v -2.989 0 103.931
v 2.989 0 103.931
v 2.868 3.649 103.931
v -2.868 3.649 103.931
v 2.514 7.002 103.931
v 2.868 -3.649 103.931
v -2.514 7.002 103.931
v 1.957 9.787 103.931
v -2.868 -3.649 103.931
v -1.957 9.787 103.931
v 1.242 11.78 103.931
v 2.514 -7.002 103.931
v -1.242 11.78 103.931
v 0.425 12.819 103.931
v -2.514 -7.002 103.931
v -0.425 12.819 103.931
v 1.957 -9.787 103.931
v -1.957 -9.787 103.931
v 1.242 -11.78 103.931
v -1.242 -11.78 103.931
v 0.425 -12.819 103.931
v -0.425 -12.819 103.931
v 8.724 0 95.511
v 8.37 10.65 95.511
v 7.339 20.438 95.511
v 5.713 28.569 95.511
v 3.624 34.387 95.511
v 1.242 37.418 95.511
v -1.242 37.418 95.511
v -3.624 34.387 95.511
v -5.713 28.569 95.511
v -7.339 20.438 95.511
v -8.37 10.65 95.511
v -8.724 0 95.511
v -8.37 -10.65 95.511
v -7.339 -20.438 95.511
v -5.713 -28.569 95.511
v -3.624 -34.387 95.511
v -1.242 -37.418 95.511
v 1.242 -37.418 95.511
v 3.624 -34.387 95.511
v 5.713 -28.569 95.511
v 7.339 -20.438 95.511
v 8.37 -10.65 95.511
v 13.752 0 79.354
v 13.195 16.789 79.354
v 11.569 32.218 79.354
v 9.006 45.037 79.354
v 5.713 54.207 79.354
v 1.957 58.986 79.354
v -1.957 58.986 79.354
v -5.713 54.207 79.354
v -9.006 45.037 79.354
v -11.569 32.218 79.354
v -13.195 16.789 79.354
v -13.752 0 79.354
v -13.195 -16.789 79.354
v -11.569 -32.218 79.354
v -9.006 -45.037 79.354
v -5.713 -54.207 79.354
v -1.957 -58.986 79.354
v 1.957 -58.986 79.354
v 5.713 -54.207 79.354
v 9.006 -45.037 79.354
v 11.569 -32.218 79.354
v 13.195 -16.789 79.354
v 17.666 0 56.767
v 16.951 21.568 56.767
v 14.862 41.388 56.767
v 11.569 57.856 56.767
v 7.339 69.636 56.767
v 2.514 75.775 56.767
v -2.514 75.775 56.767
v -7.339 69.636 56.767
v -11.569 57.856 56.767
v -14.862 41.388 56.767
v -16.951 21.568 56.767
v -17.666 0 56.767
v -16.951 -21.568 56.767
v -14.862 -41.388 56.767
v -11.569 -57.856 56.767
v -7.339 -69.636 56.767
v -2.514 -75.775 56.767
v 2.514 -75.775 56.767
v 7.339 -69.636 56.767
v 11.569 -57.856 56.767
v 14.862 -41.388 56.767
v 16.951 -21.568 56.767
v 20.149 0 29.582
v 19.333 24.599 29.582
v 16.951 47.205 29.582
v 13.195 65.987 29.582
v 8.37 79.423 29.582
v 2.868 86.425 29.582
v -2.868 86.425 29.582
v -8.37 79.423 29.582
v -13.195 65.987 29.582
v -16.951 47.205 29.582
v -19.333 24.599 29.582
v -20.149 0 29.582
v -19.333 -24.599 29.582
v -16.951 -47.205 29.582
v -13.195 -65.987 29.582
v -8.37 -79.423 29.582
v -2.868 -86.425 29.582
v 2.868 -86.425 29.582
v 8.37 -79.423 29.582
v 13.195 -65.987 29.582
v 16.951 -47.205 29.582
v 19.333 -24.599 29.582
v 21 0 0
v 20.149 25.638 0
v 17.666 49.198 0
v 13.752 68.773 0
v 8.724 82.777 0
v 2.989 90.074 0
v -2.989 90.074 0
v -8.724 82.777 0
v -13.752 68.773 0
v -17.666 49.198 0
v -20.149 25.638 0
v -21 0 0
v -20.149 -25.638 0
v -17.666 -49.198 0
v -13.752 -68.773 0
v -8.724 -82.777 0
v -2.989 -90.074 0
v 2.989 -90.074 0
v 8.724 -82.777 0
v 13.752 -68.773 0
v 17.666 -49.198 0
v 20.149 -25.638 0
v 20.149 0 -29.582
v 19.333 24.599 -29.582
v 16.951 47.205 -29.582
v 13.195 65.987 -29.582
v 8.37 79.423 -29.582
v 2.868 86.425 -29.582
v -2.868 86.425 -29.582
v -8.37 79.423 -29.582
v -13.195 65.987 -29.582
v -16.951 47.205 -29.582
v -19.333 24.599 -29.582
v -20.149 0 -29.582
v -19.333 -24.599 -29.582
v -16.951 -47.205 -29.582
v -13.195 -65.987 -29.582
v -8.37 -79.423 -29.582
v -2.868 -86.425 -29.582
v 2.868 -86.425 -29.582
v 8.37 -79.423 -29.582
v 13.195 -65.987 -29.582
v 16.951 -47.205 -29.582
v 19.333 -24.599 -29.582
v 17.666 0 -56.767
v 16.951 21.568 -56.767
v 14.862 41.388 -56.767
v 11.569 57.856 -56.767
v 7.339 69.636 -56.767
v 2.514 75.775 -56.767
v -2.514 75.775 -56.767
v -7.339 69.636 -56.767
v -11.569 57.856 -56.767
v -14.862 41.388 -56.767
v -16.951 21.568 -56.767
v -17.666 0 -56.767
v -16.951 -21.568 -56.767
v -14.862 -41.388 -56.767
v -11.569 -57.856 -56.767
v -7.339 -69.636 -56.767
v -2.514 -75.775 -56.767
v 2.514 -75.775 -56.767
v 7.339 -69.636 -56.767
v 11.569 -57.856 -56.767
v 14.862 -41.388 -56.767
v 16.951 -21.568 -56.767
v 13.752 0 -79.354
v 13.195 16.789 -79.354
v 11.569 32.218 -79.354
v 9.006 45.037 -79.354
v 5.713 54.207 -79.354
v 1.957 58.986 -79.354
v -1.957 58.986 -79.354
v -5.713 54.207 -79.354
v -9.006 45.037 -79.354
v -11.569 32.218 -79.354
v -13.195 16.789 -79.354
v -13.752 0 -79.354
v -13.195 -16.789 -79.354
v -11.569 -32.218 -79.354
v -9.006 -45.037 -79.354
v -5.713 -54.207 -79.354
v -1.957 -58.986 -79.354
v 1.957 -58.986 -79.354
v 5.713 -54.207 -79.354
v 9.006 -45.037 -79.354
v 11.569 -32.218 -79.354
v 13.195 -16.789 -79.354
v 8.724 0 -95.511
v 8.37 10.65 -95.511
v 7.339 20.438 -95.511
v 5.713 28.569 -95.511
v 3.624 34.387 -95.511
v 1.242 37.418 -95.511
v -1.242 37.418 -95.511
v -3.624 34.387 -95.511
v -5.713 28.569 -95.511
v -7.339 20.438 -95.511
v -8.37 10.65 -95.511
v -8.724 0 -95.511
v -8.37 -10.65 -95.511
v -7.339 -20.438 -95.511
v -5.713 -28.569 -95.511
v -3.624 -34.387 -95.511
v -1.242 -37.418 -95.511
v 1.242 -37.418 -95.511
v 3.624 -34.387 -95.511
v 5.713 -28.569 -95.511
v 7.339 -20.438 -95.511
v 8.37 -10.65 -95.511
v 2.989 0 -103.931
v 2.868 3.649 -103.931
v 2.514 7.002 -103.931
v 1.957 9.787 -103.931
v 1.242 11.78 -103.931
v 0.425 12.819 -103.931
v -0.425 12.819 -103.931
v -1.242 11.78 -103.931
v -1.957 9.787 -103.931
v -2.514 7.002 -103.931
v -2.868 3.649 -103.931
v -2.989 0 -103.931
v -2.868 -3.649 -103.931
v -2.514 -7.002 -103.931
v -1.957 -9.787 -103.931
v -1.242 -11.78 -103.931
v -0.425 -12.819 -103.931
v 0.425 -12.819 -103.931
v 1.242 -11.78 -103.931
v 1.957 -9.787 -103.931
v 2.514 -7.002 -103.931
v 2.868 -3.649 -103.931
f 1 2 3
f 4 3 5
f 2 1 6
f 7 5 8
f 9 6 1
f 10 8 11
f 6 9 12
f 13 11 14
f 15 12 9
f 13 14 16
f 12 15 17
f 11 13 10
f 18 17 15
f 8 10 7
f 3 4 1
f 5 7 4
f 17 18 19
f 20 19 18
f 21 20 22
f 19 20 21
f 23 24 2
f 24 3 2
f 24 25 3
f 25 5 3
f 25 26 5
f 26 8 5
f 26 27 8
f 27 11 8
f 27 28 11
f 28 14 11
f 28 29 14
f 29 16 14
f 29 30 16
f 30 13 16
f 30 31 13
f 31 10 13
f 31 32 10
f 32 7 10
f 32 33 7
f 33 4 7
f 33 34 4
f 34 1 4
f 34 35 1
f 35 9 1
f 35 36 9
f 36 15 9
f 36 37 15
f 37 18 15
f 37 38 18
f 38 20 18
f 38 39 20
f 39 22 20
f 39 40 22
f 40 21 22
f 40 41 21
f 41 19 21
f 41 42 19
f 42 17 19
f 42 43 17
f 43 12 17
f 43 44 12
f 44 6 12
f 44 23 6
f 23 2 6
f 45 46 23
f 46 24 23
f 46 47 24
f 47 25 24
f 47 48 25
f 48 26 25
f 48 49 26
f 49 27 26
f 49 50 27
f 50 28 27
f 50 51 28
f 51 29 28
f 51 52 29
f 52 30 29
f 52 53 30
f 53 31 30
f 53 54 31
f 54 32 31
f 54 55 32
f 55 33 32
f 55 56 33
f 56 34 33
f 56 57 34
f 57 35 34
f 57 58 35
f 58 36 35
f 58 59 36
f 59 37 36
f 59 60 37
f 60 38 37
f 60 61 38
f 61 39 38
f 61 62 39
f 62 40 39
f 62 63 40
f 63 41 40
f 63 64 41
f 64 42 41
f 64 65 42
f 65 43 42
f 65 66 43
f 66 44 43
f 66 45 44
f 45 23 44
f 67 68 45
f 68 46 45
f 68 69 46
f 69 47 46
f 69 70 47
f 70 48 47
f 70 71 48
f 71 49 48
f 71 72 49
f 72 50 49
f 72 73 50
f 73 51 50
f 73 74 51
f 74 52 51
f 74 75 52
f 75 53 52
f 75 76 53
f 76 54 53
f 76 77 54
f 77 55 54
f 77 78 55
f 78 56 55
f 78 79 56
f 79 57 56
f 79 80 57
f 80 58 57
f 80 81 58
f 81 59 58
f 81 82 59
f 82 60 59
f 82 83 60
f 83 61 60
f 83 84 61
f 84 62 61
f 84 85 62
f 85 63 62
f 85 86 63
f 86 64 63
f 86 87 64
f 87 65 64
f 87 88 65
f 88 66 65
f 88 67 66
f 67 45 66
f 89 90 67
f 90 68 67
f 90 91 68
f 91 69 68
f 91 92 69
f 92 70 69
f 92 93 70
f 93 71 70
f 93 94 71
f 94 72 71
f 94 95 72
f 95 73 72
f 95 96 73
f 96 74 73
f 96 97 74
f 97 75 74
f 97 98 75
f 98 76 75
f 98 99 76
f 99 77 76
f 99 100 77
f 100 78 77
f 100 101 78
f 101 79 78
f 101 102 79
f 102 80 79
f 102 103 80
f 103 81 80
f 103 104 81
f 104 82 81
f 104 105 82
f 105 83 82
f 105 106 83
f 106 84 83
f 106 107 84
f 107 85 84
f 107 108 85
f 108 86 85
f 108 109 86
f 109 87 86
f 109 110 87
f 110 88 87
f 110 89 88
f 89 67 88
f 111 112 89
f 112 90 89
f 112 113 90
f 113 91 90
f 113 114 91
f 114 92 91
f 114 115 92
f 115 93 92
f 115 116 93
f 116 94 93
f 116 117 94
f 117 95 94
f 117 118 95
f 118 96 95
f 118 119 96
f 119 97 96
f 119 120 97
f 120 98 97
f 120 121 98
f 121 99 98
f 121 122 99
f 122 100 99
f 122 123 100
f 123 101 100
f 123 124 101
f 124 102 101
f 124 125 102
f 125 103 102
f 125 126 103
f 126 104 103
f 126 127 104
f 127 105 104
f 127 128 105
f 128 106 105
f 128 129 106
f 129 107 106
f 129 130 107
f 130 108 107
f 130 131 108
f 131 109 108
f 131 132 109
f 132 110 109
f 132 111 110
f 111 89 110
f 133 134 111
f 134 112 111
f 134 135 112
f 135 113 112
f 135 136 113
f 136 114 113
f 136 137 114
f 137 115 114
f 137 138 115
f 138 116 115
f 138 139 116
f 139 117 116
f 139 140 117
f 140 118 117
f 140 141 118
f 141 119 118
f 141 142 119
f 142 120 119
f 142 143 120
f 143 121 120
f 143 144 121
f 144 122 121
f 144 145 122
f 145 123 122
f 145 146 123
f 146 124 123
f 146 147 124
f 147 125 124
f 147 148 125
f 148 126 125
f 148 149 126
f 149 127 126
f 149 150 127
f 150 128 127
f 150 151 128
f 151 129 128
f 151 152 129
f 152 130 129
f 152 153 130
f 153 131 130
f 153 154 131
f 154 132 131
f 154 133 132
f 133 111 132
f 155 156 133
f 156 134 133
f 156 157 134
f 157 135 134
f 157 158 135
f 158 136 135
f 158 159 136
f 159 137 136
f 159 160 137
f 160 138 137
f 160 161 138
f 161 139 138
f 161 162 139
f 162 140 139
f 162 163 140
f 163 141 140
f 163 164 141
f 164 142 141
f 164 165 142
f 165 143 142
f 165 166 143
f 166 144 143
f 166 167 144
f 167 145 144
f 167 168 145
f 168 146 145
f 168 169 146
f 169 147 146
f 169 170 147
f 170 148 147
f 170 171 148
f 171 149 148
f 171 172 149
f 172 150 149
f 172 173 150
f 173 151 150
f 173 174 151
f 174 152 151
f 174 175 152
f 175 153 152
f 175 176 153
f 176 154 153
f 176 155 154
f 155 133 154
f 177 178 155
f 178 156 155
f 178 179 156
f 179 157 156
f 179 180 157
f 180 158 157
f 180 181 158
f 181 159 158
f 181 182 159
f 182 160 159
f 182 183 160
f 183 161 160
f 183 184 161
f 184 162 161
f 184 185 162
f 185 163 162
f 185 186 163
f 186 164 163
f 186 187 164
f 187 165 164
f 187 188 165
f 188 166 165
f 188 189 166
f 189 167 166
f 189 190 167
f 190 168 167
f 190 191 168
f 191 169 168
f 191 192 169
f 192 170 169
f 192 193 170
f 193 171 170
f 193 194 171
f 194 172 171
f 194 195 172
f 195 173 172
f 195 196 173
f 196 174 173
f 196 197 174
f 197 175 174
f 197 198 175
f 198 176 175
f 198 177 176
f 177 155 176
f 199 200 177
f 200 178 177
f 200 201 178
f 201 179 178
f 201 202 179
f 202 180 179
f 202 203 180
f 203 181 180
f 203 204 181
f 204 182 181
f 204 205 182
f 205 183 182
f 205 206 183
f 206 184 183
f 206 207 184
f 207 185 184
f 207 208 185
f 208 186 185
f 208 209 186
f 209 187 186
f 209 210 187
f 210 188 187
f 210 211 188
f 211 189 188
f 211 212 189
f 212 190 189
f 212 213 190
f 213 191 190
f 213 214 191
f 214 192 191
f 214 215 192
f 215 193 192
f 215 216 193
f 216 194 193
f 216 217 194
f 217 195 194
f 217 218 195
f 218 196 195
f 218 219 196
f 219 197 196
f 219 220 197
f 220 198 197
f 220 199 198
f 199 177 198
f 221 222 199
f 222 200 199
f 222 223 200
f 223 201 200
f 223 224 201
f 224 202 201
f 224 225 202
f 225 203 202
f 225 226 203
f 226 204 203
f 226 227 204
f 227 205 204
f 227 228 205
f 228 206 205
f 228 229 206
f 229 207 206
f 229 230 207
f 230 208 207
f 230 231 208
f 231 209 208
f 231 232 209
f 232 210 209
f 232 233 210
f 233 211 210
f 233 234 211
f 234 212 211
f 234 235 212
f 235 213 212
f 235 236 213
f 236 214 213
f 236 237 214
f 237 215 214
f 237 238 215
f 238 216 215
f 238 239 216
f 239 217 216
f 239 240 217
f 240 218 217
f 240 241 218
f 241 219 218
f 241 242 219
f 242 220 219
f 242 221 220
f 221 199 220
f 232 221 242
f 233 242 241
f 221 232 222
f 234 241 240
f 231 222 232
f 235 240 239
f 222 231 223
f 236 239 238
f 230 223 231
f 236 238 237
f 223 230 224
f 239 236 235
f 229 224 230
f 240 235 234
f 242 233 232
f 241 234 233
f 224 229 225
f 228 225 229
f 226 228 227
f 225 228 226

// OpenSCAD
// Generated by SolidPython 1.0.1 on 2020-07-29 00:46:45


scale(v = [3, 13, 15]) {
	sphere(r = 7);
}
/***********************************************
*********      SolidPython code:      **********
************************************************
 
# import packages: SolidPython
from solid import *
from solid.utils import *
from itertools import chain, combinations, permutations


class Resize:

    def __init__(self, scad_file):
        self.scad_file = scad_file
        #self.scad_file = import_scad(scad_file)
        # cone/cylinder param:
        self.r1 = 0
        self.r2 = 0
        self.h = 0
        # rectangular prism param:
        self.w = 0
        self.l = 0
        # ellipse param:
        self.r = 0

    # import OpenScad code (file name corresponds to shape)


    # classify shape + parameters
    def assign(self, param1, param2, param3):
        if self.scad_file == 'cone.scad':
            self.r1 = param1
            self.r2 = param2
            self.h = param3
        elif self.scad_file == 'cylinder.scad':
            self.r1 = param1
            self.r2 = param2
            self.h = param3
        elif self.scad_file == 'rectangularPrism.scad':
            self.h = param1
            self.l = param2
            self.w = param3
        else:
            self.r = param1
            self.h = param2

    # resize parameters
    def iterate(self):
        x = range(3, 20, 2)
        i = 1
        if self.scad_file == 'cone.scad':
            tempList = list(permutations(x, 2))
            for temp in tempList:
                param1 = temp[0]
                param2 = temp[1]
                filepath = 'produced_scad_files/' + 'cone' + str(param1) + '_' + str(param2) + '_' + '.scad'
                scad_render_to_file(cylinder(h=param1, r1=param2, r2=0), filepath)

        elif self.scad_file == 'cylinder.scad':
            tempList = list(permutations(x, 3))
            for temp in tempList:
                param1 = temp[0]
                param2 = temp[1]
                filepath = 'produced_scad_files/' + 'cylinder' + str(param1) + '_' + str(param2) + '_' + '.scad'
                scad_render_to_file(cylinder(h=param1, r1=param2, r2=param2), filepath)

        elif self.scad_file == 'rectangularPrism.scad':
            tempList = list(permutations(x, 3))
            for temp in tempList:
                param1 = temp[0]
                param2 = temp[1]
                param3 = temp[2]
                filepath = 'produced_scad_files/' + 'rectangularPrism' + str(param1) + '_' + str(param2) + '_' + str(
                    param3) + '.scad'
                scad_render_to_file(cube(size=(param1, param2, param3)), filepath)

        elif self.scad_file == 'ellipse.scad':
            tempList = list(permutations(x, 4))
            for temp in tempList:
                param1 = temp[0]
                param2 = temp[1]
                param3 = temp[2]
                param4 = temp[3]
                filepath = 'produced_scad_files/' + 'ellipse' + str(param1) + '_' + str(param2) + '_' + str(param3) + '_' + str(param4) + '.scad'
                scad_render_to_file(scale([param1, param2, param3])(sphere(r=param4)), filepath)

    def render_to_scadfile(self):
        scad_render_to_file(scad, 'example.scad') 
 
************************************************/
